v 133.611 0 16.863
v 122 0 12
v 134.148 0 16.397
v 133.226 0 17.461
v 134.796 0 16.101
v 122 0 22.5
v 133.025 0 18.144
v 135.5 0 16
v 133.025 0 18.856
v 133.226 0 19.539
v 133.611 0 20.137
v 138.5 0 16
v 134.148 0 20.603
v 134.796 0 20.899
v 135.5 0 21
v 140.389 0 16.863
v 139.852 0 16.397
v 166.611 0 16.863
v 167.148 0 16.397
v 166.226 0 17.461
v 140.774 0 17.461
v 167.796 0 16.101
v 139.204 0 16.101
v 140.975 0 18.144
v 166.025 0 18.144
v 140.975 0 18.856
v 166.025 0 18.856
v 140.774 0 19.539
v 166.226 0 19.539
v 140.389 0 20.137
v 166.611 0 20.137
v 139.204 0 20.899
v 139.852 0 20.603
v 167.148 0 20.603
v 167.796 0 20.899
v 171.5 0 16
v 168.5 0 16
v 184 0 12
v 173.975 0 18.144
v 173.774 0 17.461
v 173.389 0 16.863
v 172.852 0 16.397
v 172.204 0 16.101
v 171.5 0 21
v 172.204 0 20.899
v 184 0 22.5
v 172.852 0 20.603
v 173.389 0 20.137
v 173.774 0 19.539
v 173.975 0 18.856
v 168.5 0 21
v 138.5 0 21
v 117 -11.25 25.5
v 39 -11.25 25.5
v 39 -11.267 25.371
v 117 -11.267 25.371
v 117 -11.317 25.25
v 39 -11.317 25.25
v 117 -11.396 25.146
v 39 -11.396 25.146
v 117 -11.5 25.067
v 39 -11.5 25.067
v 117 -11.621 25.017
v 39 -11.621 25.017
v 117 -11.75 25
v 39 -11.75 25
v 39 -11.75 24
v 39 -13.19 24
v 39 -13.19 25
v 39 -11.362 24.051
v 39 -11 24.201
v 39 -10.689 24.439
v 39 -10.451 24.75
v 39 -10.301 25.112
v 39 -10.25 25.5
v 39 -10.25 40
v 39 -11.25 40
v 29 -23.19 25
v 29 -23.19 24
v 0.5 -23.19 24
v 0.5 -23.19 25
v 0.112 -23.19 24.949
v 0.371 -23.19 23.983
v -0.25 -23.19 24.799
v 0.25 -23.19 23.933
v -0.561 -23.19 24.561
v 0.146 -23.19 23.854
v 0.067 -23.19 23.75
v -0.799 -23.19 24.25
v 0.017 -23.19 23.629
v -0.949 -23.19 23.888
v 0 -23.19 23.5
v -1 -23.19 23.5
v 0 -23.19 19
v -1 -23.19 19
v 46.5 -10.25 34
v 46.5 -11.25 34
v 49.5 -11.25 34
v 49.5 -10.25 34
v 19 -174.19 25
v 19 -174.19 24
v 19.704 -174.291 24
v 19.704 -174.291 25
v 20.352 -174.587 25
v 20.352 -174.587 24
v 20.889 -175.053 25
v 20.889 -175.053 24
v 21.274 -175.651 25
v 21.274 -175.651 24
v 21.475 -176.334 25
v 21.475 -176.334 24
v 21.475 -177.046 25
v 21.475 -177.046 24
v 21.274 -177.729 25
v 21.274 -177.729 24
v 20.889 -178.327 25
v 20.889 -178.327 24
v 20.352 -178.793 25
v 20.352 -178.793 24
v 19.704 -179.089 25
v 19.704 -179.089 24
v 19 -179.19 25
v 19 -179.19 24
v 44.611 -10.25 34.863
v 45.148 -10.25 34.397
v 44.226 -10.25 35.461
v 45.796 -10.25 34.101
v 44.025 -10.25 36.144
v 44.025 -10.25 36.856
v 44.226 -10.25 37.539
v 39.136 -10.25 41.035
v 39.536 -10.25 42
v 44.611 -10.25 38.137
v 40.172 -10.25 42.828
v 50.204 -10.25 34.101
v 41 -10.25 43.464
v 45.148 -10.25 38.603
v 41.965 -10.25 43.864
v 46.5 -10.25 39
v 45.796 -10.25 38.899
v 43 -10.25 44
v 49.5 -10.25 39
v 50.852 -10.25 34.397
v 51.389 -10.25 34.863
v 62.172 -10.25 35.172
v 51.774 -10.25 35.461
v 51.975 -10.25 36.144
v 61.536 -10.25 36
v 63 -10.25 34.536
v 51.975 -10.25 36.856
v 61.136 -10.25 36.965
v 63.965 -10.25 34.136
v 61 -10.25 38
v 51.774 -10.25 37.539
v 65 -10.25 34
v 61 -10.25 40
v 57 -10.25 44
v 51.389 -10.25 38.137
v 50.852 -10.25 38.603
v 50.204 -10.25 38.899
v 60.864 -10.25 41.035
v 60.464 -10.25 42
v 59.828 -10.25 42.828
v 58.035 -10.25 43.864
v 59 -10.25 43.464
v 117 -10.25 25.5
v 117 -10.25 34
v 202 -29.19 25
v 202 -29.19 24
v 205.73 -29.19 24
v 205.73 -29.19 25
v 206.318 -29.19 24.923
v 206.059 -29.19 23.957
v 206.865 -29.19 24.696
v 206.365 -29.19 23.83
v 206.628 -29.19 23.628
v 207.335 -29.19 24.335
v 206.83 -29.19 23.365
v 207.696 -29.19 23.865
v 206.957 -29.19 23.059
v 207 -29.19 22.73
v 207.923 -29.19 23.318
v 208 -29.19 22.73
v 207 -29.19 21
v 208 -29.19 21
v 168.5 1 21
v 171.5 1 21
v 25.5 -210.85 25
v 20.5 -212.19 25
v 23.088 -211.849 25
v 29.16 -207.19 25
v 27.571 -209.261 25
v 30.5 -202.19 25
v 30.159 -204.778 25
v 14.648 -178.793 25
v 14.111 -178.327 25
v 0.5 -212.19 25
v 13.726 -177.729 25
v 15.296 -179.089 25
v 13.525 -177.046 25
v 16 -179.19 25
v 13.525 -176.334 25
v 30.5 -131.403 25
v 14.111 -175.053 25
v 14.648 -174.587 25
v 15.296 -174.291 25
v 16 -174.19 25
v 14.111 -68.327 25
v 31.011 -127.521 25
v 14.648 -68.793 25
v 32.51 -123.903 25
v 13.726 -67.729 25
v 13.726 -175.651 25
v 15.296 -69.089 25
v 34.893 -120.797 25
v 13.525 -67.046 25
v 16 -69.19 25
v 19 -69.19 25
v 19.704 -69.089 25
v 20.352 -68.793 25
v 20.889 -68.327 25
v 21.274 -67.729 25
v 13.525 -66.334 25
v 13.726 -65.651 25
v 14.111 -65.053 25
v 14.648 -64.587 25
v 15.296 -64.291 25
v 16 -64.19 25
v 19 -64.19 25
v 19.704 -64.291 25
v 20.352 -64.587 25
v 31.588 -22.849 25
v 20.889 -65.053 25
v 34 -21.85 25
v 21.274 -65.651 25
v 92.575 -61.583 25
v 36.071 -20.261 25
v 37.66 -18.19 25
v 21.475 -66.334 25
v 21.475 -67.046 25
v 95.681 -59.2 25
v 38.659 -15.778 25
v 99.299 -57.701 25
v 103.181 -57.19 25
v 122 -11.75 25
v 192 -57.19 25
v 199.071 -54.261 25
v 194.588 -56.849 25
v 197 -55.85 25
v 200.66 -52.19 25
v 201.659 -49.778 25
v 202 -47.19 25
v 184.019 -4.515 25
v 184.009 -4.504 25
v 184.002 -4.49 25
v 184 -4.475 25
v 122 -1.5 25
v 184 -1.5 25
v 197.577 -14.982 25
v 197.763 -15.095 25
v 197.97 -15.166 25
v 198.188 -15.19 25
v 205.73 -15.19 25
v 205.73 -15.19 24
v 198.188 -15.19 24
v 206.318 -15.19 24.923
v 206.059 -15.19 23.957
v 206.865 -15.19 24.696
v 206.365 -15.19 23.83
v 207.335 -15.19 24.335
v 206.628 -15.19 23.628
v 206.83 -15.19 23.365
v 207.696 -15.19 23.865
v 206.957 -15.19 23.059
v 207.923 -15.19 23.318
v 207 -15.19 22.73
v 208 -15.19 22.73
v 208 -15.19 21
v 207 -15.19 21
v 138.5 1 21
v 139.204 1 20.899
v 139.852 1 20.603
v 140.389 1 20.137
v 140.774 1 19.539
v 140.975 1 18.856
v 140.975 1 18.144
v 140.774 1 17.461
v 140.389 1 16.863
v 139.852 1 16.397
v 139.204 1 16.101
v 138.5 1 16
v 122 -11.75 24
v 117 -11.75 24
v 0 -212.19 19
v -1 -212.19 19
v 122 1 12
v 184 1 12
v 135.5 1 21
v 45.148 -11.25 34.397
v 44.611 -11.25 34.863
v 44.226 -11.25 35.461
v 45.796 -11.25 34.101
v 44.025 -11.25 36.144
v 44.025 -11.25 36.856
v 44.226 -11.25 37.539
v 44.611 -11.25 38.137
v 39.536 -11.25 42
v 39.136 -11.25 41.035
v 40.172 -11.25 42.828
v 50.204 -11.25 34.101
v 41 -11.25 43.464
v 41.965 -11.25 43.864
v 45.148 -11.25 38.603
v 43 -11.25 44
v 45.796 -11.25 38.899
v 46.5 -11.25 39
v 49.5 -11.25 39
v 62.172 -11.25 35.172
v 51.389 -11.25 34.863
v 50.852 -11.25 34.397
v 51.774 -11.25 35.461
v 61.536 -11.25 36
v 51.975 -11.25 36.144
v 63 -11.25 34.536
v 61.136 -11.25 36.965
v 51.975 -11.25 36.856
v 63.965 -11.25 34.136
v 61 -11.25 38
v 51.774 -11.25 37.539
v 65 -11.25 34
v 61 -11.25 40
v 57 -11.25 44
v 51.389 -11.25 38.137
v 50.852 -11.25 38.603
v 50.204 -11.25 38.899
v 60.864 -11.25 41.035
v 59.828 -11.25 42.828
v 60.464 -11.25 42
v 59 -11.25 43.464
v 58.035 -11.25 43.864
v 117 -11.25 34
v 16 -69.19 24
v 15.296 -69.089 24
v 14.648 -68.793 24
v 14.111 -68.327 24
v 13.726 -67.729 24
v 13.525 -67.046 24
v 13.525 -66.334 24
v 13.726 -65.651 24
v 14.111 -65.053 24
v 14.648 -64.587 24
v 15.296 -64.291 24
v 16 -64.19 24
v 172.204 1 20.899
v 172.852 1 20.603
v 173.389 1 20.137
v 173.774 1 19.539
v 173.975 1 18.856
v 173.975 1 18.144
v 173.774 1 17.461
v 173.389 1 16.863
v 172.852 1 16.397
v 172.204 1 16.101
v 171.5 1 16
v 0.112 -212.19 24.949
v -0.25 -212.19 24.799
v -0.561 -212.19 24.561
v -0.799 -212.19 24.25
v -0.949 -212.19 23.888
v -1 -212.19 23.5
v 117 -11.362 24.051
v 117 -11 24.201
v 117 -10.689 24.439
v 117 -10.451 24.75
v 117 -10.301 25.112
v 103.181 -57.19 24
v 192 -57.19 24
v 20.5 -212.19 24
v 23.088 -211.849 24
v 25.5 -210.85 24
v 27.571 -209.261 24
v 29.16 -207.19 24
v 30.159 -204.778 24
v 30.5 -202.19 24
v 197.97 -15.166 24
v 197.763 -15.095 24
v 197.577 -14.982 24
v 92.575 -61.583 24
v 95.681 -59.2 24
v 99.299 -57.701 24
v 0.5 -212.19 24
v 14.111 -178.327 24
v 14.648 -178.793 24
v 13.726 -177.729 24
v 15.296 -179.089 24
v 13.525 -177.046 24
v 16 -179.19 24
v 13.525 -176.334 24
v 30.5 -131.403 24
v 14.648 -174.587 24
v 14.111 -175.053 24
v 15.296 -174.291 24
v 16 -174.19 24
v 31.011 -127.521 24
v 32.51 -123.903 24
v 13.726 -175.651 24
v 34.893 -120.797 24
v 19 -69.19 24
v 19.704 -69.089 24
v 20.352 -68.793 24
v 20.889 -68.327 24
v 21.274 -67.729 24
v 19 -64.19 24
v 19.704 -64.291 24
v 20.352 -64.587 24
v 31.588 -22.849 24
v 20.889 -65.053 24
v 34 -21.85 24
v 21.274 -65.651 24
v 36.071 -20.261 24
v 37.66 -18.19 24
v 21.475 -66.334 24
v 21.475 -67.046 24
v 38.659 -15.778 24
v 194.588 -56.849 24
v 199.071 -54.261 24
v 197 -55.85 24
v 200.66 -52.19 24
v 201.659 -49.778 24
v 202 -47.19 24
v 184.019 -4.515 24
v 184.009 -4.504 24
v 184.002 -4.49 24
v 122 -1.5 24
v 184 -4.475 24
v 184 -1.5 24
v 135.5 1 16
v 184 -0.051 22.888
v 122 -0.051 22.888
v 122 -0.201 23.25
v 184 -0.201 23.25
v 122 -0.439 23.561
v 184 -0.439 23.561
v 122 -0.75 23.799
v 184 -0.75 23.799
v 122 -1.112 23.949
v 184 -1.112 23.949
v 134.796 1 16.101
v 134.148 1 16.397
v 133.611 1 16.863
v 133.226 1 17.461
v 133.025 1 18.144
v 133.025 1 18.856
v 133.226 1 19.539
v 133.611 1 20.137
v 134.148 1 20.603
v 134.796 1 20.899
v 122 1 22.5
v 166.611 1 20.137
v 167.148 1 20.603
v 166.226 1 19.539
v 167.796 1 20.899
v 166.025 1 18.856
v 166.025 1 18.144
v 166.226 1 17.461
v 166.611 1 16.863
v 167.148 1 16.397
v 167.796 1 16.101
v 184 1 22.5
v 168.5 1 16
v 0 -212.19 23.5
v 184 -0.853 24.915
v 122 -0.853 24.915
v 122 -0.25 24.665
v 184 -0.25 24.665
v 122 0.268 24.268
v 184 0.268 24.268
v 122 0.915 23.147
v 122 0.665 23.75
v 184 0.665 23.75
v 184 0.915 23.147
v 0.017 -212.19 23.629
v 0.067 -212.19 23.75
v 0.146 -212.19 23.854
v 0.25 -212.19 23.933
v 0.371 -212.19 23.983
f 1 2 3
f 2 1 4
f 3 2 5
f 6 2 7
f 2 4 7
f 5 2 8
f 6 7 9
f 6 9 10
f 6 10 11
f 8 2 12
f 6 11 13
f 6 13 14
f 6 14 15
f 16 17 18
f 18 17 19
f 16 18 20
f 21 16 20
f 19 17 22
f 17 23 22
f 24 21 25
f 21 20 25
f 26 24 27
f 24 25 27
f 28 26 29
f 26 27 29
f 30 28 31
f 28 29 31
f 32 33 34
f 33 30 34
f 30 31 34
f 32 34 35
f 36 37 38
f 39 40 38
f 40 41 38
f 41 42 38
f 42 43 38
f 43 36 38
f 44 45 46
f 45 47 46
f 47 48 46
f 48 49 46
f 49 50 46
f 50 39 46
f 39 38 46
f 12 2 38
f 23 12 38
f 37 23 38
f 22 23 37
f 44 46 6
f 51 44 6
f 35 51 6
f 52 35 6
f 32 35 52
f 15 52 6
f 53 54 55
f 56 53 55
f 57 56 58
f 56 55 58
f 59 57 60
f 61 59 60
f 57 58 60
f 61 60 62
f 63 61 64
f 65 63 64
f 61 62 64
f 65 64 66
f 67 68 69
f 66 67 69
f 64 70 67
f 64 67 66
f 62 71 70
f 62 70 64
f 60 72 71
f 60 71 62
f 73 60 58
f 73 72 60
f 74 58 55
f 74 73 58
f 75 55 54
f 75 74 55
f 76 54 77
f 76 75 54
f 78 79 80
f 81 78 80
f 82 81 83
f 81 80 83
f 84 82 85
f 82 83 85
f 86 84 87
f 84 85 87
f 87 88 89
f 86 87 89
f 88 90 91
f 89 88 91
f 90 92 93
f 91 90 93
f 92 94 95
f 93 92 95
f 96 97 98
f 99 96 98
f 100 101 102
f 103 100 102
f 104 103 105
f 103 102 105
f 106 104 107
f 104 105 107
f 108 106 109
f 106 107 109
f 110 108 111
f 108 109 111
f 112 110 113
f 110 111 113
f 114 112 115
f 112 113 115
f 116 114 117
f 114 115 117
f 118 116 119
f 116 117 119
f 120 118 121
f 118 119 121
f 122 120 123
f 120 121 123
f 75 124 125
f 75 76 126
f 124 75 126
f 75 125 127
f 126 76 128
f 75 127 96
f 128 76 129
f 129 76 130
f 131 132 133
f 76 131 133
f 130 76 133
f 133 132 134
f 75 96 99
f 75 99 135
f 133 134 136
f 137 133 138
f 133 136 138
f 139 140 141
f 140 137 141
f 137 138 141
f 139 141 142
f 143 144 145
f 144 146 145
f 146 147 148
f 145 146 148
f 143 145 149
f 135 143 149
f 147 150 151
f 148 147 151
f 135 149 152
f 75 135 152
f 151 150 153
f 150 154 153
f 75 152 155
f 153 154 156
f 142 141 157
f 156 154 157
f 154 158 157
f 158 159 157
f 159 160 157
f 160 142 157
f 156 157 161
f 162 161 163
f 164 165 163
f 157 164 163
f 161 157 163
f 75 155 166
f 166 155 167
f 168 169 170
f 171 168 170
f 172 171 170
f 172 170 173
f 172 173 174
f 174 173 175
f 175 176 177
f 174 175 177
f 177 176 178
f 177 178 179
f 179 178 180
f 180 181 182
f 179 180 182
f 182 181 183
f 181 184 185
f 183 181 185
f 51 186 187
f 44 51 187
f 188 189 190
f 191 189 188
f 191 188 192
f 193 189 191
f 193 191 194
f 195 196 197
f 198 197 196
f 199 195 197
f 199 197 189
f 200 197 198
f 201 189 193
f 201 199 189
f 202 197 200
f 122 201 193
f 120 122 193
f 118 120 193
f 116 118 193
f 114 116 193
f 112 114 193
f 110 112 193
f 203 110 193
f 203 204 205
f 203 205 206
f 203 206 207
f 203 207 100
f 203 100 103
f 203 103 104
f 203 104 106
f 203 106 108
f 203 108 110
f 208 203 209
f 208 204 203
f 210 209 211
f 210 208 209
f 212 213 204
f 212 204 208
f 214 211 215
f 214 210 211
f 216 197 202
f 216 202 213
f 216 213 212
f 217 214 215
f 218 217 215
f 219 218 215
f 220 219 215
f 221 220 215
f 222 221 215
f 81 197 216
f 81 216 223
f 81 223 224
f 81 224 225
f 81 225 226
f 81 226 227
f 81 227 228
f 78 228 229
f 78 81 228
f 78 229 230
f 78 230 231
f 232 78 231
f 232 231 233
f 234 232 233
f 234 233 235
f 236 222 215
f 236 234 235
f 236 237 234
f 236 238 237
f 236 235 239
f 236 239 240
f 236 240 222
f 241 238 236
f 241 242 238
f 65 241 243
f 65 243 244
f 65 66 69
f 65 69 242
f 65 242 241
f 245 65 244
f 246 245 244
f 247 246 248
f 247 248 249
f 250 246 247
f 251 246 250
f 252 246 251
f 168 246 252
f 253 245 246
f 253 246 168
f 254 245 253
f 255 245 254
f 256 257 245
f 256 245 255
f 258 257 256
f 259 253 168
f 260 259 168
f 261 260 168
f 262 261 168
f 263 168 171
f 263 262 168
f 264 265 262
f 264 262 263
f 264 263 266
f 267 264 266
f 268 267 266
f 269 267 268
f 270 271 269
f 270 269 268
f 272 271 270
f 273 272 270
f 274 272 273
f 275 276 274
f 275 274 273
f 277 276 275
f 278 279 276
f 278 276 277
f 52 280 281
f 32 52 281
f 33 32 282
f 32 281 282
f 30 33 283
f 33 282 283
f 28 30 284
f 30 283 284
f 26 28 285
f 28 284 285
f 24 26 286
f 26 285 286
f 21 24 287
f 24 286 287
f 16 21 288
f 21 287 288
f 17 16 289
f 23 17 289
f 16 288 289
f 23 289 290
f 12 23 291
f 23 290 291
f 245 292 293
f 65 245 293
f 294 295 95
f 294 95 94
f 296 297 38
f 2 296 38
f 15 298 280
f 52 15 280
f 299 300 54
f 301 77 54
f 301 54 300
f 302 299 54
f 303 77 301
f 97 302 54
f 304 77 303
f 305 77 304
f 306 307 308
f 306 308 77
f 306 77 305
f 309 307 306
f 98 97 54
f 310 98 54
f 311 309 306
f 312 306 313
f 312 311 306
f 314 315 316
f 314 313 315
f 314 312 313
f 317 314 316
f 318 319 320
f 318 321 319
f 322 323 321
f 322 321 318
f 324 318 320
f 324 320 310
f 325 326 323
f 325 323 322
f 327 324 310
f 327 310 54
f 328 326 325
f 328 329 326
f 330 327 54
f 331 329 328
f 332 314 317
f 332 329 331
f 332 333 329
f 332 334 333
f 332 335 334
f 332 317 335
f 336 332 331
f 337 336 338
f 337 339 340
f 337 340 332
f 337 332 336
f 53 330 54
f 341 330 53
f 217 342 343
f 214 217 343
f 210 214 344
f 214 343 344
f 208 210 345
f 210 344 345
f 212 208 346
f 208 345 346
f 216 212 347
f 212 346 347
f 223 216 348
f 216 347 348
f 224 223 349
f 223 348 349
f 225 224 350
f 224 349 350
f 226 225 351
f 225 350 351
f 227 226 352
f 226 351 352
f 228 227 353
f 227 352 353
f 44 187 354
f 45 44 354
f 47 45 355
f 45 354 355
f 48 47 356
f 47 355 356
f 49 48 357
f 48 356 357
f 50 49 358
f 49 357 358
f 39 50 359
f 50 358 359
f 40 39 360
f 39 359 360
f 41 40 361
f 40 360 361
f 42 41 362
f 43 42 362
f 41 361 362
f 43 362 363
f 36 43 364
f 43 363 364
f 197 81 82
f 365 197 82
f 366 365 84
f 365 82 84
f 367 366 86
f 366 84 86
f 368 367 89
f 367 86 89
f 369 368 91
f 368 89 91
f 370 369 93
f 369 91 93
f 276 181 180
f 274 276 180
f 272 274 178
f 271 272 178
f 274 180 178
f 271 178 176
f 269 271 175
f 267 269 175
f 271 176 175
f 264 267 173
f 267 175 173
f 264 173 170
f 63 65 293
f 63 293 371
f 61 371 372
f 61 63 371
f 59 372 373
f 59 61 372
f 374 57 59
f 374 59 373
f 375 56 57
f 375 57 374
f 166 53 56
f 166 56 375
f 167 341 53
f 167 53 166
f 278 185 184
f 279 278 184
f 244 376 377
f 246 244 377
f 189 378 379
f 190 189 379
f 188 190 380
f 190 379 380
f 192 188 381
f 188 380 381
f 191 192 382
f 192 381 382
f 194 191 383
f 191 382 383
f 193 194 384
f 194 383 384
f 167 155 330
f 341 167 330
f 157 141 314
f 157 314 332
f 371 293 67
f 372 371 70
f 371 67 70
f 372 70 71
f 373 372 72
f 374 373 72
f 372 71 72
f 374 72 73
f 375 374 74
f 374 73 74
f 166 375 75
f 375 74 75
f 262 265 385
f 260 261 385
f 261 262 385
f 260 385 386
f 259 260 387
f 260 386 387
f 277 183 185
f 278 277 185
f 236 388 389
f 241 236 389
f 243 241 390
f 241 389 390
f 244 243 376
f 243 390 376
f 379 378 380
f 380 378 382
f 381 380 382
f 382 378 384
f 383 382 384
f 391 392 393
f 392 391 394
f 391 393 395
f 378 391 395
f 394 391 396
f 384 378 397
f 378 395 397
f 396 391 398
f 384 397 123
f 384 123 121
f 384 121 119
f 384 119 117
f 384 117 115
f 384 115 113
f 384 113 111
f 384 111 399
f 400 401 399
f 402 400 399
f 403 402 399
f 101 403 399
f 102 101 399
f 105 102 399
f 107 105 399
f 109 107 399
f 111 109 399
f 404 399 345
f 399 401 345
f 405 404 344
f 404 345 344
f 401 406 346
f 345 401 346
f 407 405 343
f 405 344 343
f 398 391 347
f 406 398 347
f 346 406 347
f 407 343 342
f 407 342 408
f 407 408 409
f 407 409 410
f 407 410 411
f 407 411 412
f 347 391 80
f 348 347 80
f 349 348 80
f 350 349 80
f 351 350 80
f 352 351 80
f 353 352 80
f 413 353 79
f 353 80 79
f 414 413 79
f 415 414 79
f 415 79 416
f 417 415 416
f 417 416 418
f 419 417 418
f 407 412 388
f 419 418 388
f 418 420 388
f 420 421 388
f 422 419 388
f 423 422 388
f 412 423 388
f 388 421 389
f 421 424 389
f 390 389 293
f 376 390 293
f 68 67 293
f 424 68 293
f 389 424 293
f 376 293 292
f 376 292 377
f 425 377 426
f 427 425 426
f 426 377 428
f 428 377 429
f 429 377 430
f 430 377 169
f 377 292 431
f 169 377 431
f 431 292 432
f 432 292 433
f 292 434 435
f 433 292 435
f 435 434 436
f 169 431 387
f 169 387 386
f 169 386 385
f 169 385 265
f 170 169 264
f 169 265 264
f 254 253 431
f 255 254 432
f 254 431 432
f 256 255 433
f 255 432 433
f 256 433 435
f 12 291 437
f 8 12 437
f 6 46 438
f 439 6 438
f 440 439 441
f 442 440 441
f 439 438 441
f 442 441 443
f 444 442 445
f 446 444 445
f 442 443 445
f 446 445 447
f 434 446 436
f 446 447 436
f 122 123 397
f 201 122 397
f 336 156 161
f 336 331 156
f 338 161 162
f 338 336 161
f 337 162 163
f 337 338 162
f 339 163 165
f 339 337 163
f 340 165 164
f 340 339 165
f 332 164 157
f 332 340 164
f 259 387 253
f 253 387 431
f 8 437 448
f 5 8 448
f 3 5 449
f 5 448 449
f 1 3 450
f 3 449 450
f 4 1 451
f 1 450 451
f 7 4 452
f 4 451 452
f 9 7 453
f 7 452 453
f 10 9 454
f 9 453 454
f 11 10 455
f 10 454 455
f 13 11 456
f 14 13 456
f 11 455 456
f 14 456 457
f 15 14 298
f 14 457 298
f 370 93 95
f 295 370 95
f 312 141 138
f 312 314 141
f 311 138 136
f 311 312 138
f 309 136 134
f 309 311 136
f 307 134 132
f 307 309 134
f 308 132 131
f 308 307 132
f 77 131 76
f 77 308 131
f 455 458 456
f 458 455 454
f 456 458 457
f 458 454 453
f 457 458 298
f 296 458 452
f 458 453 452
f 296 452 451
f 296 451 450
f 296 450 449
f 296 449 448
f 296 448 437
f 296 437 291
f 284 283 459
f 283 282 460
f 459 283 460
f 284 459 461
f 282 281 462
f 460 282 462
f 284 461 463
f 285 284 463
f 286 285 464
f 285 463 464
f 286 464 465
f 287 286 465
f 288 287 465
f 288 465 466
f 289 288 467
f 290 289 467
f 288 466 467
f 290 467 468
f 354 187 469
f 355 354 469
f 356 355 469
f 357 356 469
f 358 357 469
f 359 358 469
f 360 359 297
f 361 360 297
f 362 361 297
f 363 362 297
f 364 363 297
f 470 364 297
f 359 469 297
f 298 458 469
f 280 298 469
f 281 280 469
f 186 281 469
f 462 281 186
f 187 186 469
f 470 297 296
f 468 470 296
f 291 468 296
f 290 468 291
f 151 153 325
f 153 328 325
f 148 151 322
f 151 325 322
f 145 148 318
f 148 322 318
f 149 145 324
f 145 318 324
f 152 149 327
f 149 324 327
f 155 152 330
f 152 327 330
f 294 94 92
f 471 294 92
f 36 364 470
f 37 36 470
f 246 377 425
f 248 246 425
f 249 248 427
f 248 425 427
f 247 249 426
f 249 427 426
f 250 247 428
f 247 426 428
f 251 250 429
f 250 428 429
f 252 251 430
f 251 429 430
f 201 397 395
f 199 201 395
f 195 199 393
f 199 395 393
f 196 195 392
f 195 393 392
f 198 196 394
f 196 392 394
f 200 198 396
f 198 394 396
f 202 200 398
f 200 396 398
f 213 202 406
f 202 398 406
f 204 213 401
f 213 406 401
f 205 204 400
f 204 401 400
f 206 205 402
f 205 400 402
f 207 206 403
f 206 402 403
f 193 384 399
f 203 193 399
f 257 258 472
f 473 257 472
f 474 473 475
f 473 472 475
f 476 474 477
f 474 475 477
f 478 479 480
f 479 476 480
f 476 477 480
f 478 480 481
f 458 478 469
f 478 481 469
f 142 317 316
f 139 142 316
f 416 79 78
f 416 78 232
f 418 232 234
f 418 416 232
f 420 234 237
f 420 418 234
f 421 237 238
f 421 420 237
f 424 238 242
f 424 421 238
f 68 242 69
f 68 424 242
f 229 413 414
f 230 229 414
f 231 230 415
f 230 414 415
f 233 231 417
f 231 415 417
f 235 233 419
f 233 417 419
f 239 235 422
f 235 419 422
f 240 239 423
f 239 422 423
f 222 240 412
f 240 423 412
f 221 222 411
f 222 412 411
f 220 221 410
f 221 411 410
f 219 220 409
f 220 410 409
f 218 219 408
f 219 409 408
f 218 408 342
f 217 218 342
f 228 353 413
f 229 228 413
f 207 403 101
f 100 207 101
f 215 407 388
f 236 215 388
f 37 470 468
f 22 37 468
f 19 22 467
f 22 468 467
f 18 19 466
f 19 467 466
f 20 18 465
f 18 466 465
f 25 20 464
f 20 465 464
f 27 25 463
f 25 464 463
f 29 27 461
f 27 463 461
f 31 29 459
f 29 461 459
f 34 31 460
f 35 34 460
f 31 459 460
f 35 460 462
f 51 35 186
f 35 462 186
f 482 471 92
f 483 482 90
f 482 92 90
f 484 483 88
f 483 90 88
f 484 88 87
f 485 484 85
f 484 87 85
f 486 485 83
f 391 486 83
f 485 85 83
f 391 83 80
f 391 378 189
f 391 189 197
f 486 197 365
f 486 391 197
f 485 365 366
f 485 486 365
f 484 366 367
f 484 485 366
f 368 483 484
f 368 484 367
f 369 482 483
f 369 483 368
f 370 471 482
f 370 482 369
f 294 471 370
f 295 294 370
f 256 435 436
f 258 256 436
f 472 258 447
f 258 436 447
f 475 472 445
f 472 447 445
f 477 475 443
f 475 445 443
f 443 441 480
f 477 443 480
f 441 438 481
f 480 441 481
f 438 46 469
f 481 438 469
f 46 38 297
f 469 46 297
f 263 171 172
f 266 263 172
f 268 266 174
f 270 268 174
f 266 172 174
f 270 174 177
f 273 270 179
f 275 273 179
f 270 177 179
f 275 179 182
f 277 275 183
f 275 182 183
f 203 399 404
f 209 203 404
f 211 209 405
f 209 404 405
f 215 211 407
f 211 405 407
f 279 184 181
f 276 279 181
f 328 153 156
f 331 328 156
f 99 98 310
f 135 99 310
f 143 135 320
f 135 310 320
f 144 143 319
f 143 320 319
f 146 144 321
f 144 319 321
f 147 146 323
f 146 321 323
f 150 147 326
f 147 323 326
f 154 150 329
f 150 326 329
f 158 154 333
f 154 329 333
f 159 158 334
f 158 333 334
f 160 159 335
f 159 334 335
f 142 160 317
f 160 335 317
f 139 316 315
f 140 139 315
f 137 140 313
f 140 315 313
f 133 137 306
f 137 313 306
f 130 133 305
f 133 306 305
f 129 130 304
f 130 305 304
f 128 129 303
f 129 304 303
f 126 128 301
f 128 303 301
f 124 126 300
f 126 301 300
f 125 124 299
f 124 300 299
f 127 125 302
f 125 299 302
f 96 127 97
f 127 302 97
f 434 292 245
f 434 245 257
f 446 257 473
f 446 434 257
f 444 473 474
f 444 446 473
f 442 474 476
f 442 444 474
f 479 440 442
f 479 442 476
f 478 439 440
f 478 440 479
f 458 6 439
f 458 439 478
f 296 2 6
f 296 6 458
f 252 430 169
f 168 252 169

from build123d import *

# Parameters (mm, degrees)
BASE_FLANGE1_DEPTH            = 1
EDGE_FLANGE1_STRIP_W          = 5
EDGE_FLANGE1_STRIP_H          = 1
EDGE_FLANGE1_STRIP_CUT_DEPTH  = 189
EDGE_FLANGE1_RELIEF_W         = 5.5
EDGE_FLANGE1_RELIEF_H         = 0.5
EDGE_FLANGE1_RELIEF_CUT_DEPTH = 1
EDGE_FLANGE1_DEPTH            = 189
CUT_EXTRUDE1_DEPTH            = 10
EDGE_FLANGE2_STRIP_W          = 7
EDGE_FLANGE2_STRIP_H          = 1
EDGE_FLANGE2_STRIP_CUT_DEPTH  = 62
EDGE_FLANGE2_RELIEF_W         = 7.5
EDGE_FLANGE2_RELIEF_H         = 0.5
EDGE_FLANGE2_RELIEF_CUT_DEPTH = 1
EDGE_FLANGE2_DEPTH            = 62
SKETCH13_W                    = 5
SKETCH13_H                    = 14
TAB1_DEPTH                    = 1
CUT_EXTRUDE4_DEPTH            = 10
EDGE_FLANGE3_STRIP_W          = 6.54
EDGE_FLANGE3_STRIP_H          = 1
EDGE_FLANGE3_STRIP_CUT_DEPTH  = 14
EDGE_FLANGE3_DEPTH            = 14
CUT_EXTRUDE3_DEPTH            = 10
EDGE_FLANGE5_DEPTH            = 78
SKETCH33_W                    = 22
SKETCH33_H                    = 10
TAB2_DEPTH                    = 1
FILLET1_R                     = 4
FILLET2_R                     = 4
CUT_EXTRUDE5_DEPTH            = 1
CUT_EXTRUDE6_DEPTH            = 1
CUT_EXTRUDE7_DEPTH            = 1


# Sheet-metal steps are written as plain solids
with BuildPart() as part:
    # Sketch1 → Base-Flange1 (new body)
    with BuildSketch(Plane.XY):
        with BuildLine():
            Line((0, 0), (0, -212.19))
            Line((0, -212.19), (20.5, -212.19))
            ThreePointArc((20.5, -212.19), (27.571067812, -209.261067812), (30.5, -202.19))
            Line((30.5, -202.19), (30.5, -131.403203436))
            ThreePointArc((30.5, -131.403203436), (31.641807012, -125.66295195), (34.893398282, -120.796601718))
            Line((34.893398282, -120.796601718), (92.574639149, -61.583398282))
            ThreePointArc((92.574639149, -61.583398282), (97.440989382, -58.331807012), (103.181240867, -57.19))
            Line((103.181240867, -57.19), (192, -57.19))
            ThreePointArc((192, -57.19), (199.071067812, -54.261067812), (202, -47.19))
            Line((202, -47.19), (202, 0))
            Line((202, 0), (0, 0))
        make_face()
    extrude(amount=-BASE_FLANGE1_DEPTH)

    # Edge-Flange1 strip (across the edge) → Edge-Flange1 strip cut (cut)
    with BuildSketch(Plane.XZ.offset(23.19)):
        with Locations((-2, -0.5)):
            Rectangle(EDGE_FLANGE1_STRIP_W, EDGE_FLANGE1_STRIP_H)
    extrude(amount=EDGE_FLANGE1_STRIP_CUT_DEPTH, mode=Mode.SUBTRACT)

    # Edge-Flange1 relief (on the sheet) → Edge-Flange1 relief cut (cut)
    with BuildSketch(Plane(origin=(0.5, -23.19, 0), x_dir=(1, 0, 0), z_dir=(0, 0, 1))):
        with Locations((-2.25, 0.25)):
            Rectangle(EDGE_FLANGE1_RELIEF_W, EDGE_FLANGE1_RELIEF_H)
    extrude(amount=-EDGE_FLANGE1_RELIEF_CUT_DEPTH, mode=Mode.SUBTRACT)

    # Edge-Flange1 section (across the edge) → Edge-Flange1 (add)
    with BuildSketch(Plane.XZ.offset(23.19)):
        with BuildLine():
            Line((-1, 0.5), (-1, 5))
            Line((-1, 5), (0, 5))
            Line((0, 5), (0, 0.5))
            ThreePointArc((0, 0.5), (0.146446609, 0.146446609), (0.5, 0))
            Line((0.5, 0), (0.5, -1))
            ThreePointArc((0.5, -1), (-0.560660172, -0.560660172), (-1, 0.5))
        make_face()
    extrude(amount=EDGE_FLANGE1_DEPTH)

    # Sketch9 → Cut-Extrude1 (cut)
    with BuildSketch(Plane.XY):
        with BuildLine():
            Line((-1, -23.19), (29, -23.19))
            ThreePointArc((29, -23.19), (36.071067812, -20.261067812), (39, -13.19))
            Line((39, -13.19), (39, 0))
            Line((39, 0), (-1, 0))
            Line((-1, 0), (-1, -23.19))
        make_face()
    extrude(amount=-CUT_EXTRUDE1_DEPTH, mode=Mode.SUBTRACT)

    # Edge-Flange2 strip (across the edge) → Edge-Flange2 strip cut (cut)
    with BuildSketch(Plane(origin=(184, 0, 0), x_dir=(0, -1, 0), z_dir=(-1, 0, 0))):
        with Locations((-2, -0.5)):
            Rectangle(EDGE_FLANGE2_STRIP_W, EDGE_FLANGE2_STRIP_H)
    extrude(amount=EDGE_FLANGE2_STRIP_CUT_DEPTH, mode=Mode.SUBTRACT)

    # Edge-Flange2 relief (on the sheet) → Edge-Flange2 relief cut (cut)
    with BuildSketch(Plane(origin=(184, -1.5, 0), x_dir=(0, -1, 0), z_dir=(0, 0, 1))):
        with Locations((-3.25, 0.25)):
            Rectangle(EDGE_FLANGE2_RELIEF_W, EDGE_FLANGE2_RELIEF_H)
        with Locations((-3.25, -62.25)):
            Rectangle(EDGE_FLANGE2_RELIEF_W, EDGE_FLANGE2_RELIEF_H)
    extrude(amount=-EDGE_FLANGE2_RELIEF_CUT_DEPTH, mode=Mode.SUBTRACT)

    # Edge-Flange2 section (across the edge) → Edge-Flange2 (add)
    with BuildSketch(Plane(origin=(184, 0, 0), x_dir=(0, -1, 0), z_dir=(-1, 0, 0))):
        with BuildLine():
            Line((-1, 1.5), (-1, 12))
            Line((-1, 12), (0, 12))
            Line((0, 12), (0, 1.5))
            ThreePointArc((0, 1.5), (0.439339828, 0.439339828), (1.5, 0))
            Line((1.5, 0), (1.5, -1))
            ThreePointArc((1.5, -1), (-0.267766953, -0.267766953), (-1, 1.5))
        make_face()
    extrude(amount=EDGE_FLANGE2_DEPTH)

    # Sketch13 → Tab1 (add)
    with BuildSketch(Plane.XY):
        with Locations((204.5, -22.19)):
            Rectangle(SKETCH13_W, SKETCH13_H)
    extrude(amount=-TAB1_DEPTH)

    # Sketch16 → Cut-Extrude4 (cut)
    with BuildSketch(Plane.XY):
        with BuildLine():
            Line((202, -15.19), (198.18765136, -15.19))
            ThreePointArc((198.18765136, -15.19), (197.864812853, -15.136454066), (197.576547726, -14.981550598))
            Line((197.576547726, -14.981550598), (184.019444818, -4.515012052))
            ThreePointArc((184.019444818, -4.515012052), (184.005123731, -4.497482662), (184, -4.475434523))
            Line((184, -4.475434523), (184, -1.5))
            Line((184, -1.5), (184, 0))
            Line((184, 0), (202, 0))
            Line((202, 0), (202, -15.19))
        make_face()
    extrude(amount=-CUT_EXTRUDE4_DEPTH, mode=Mode.SUBTRACT)

    # Edge-Flange3 strip (across the edge) → Edge-Flange3 strip cut (cut)
    with BuildSketch(Plane(origin=(207, -29.19, 0), x_dir=(-1, 0, 0), z_dir=(0, 1, 0))):
        with Locations((-2, -0.5)):
            Rectangle(EDGE_FLANGE3_STRIP_W, EDGE_FLANGE3_STRIP_H)
    extrude(amount=EDGE_FLANGE3_STRIP_CUT_DEPTH, mode=Mode.SUBTRACT)

    # Edge-Flange3 section (across the edge) → Edge-Flange3 (add)
    with BuildSketch(Plane(origin=(207, -29.19, 0), x_dir=(-1, 0, 0), z_dir=(0, 1, 0))):
        with BuildLine():
            Line((-1, 1.27), (-1, 3))
            Line((-1, 3), (0, 3))
            Line((0, 3), (0, 1.27))
            ThreePointArc((0, 1.27), (0.371974388, 0.371974388), (1.27, 0))
            Line((1.27, 0), (1.27, -1))
            ThreePointArc((1.27, -1), (-0.335132393, -0.335132393), (-1, 1.27))
        make_face()
    extrude(amount=EDGE_FLANGE3_DEPTH)

    # Sketch20 → Cut-Extrude3 (cut)
    with BuildSketch(Plane.XY):
        Polygon((122, -0.75), (122, -11.75), (38.53901494, -11.75), (38.53901494, 0), (122, 0), align=None)
    extrude(amount=-CUT_EXTRUDE3_DEPTH, mode=Mode.SUBTRACT)

    # Edge-Flange5 section (across the edge) → Edge-Flange5 (add)
    with BuildSketch(Plane(origin=(39, -11.25, -1), x_dir=(0, -1, 0), z_dir=(1, 0, 0))):
        with BuildLine():
            Line((-1, 0.5), (-1, 9))
            Line((-1, 9), (0, 9))
            Line((0, 9), (0, 0.5))
            ThreePointArc((0, 0.5), (0.146446609, 0.146446609), (0.5, 0))
            Line((0.5, 0), (0.5, -1))
            ThreePointArc((0.5, -1), (-0.560660172, -0.560660172), (-1, 0.5))
        make_face()
    extrude(amount=EDGE_FLANGE5_DEPTH)

    # Sketch33 → Tab2 (add)
    with BuildSketch(Plane(origin=(0, -10.25, 0), x_dir=(1, 0, 0), z_dir=(0, 1, 0))):
        with Locations((50, 15)):
            Rectangle(SKETCH33_W, SKETCH33_H)
    extrude(amount=-TAB2_DEPTH)

    # Fillet1
    fillet1_edges = [part.edges().sort_by_distance(p)[0] for p in [
        (61, -10.75, -10),
    ]]
    fillet(fillet1_edges, radius=FILLET1_R)

    # Fillet2
    fillet2_edges = [part.edges().sort_by_distance(p)[0] for p in [
        (39, -10.75, -20),
        (61, -10.75, -20),
    ]]
    fillet(fillet2_edges, radius=FILLET2_R)

    # Sketch35 → Cut-Extrude5 (cut)
    with BuildSketch(Plane(origin=(0, 1, 0), x_dir=(1, 0, 0), z_dir=(0, 1, 0))):
        with BuildLine():
            Line((171.5, -8), (168.5, -8))
            ThreePointArc((168.5, -8), (166, -5.5), (168.5, -3))
            Line((168.5, -3), (171.5, -3))
            ThreePointArc((171.5, -3), (174, -5.5), (171.5, -8))
        make_face()
        with BuildLine():
            Line((138.5, -8), (135.5, -8))
            ThreePointArc((135.5, -8), (133, -5.5), (135.5, -3))
            Line((135.5, -3), (138.5, -3))
            ThreePointArc((138.5, -3), (141, -5.5), (138.5, -8))
        make_face()
    extrude(amount=-CUT_EXTRUDE5_DEPTH, mode=Mode.SUBTRACT)

    # Sketch36 → Cut-Extrude6 (cut)
    with BuildSketch(Plane.XZ.offset(11.25)):
        with BuildLine():
            Line((49.5, -15), (46.5, -15))
            ThreePointArc((46.5, -15), (44, -12.5), (46.5, -10))
            Line((46.5, -10), (49.5, -10))
            ThreePointArc((49.5, -10), (52, -12.5), (49.5, -15))
        make_face()
    extrude(amount=-CUT_EXTRUDE6_DEPTH, mode=Mode.SUBTRACT)

    # Sketch38 → Cut-Extrude7 (cut)
    with BuildSketch(Plane.XY):
        with BuildLine():
            Line((16, -174.19), (19, -174.19))
            ThreePointArc((19, -174.19), (21.5, -176.69), (19, -179.19))
            Line((19, -179.19), (16, -179.19))
            ThreePointArc((16, -179.19), (13.5, -176.69), (16, -174.19))
        make_face()
        with BuildLine():
            Line((16, -64.19), (19, -64.19))
            ThreePointArc((19, -64.19), (21.5, -66.69), (19, -69.19))
            Line((19, -69.19), (16, -69.19))
            ThreePointArc((16, -69.19), (13.5, -66.69), (16, -64.19))
        make_face()
    extrude(amount=-CUT_EXTRUDE7_DEPTH, mode=Mode.SUBTRACT)


with BuildPart() as body_2:
    # Mirror1: mirrored copy
    add(part.part.mirror(Plane.XY.offset(12)))


solid = body_2.part
